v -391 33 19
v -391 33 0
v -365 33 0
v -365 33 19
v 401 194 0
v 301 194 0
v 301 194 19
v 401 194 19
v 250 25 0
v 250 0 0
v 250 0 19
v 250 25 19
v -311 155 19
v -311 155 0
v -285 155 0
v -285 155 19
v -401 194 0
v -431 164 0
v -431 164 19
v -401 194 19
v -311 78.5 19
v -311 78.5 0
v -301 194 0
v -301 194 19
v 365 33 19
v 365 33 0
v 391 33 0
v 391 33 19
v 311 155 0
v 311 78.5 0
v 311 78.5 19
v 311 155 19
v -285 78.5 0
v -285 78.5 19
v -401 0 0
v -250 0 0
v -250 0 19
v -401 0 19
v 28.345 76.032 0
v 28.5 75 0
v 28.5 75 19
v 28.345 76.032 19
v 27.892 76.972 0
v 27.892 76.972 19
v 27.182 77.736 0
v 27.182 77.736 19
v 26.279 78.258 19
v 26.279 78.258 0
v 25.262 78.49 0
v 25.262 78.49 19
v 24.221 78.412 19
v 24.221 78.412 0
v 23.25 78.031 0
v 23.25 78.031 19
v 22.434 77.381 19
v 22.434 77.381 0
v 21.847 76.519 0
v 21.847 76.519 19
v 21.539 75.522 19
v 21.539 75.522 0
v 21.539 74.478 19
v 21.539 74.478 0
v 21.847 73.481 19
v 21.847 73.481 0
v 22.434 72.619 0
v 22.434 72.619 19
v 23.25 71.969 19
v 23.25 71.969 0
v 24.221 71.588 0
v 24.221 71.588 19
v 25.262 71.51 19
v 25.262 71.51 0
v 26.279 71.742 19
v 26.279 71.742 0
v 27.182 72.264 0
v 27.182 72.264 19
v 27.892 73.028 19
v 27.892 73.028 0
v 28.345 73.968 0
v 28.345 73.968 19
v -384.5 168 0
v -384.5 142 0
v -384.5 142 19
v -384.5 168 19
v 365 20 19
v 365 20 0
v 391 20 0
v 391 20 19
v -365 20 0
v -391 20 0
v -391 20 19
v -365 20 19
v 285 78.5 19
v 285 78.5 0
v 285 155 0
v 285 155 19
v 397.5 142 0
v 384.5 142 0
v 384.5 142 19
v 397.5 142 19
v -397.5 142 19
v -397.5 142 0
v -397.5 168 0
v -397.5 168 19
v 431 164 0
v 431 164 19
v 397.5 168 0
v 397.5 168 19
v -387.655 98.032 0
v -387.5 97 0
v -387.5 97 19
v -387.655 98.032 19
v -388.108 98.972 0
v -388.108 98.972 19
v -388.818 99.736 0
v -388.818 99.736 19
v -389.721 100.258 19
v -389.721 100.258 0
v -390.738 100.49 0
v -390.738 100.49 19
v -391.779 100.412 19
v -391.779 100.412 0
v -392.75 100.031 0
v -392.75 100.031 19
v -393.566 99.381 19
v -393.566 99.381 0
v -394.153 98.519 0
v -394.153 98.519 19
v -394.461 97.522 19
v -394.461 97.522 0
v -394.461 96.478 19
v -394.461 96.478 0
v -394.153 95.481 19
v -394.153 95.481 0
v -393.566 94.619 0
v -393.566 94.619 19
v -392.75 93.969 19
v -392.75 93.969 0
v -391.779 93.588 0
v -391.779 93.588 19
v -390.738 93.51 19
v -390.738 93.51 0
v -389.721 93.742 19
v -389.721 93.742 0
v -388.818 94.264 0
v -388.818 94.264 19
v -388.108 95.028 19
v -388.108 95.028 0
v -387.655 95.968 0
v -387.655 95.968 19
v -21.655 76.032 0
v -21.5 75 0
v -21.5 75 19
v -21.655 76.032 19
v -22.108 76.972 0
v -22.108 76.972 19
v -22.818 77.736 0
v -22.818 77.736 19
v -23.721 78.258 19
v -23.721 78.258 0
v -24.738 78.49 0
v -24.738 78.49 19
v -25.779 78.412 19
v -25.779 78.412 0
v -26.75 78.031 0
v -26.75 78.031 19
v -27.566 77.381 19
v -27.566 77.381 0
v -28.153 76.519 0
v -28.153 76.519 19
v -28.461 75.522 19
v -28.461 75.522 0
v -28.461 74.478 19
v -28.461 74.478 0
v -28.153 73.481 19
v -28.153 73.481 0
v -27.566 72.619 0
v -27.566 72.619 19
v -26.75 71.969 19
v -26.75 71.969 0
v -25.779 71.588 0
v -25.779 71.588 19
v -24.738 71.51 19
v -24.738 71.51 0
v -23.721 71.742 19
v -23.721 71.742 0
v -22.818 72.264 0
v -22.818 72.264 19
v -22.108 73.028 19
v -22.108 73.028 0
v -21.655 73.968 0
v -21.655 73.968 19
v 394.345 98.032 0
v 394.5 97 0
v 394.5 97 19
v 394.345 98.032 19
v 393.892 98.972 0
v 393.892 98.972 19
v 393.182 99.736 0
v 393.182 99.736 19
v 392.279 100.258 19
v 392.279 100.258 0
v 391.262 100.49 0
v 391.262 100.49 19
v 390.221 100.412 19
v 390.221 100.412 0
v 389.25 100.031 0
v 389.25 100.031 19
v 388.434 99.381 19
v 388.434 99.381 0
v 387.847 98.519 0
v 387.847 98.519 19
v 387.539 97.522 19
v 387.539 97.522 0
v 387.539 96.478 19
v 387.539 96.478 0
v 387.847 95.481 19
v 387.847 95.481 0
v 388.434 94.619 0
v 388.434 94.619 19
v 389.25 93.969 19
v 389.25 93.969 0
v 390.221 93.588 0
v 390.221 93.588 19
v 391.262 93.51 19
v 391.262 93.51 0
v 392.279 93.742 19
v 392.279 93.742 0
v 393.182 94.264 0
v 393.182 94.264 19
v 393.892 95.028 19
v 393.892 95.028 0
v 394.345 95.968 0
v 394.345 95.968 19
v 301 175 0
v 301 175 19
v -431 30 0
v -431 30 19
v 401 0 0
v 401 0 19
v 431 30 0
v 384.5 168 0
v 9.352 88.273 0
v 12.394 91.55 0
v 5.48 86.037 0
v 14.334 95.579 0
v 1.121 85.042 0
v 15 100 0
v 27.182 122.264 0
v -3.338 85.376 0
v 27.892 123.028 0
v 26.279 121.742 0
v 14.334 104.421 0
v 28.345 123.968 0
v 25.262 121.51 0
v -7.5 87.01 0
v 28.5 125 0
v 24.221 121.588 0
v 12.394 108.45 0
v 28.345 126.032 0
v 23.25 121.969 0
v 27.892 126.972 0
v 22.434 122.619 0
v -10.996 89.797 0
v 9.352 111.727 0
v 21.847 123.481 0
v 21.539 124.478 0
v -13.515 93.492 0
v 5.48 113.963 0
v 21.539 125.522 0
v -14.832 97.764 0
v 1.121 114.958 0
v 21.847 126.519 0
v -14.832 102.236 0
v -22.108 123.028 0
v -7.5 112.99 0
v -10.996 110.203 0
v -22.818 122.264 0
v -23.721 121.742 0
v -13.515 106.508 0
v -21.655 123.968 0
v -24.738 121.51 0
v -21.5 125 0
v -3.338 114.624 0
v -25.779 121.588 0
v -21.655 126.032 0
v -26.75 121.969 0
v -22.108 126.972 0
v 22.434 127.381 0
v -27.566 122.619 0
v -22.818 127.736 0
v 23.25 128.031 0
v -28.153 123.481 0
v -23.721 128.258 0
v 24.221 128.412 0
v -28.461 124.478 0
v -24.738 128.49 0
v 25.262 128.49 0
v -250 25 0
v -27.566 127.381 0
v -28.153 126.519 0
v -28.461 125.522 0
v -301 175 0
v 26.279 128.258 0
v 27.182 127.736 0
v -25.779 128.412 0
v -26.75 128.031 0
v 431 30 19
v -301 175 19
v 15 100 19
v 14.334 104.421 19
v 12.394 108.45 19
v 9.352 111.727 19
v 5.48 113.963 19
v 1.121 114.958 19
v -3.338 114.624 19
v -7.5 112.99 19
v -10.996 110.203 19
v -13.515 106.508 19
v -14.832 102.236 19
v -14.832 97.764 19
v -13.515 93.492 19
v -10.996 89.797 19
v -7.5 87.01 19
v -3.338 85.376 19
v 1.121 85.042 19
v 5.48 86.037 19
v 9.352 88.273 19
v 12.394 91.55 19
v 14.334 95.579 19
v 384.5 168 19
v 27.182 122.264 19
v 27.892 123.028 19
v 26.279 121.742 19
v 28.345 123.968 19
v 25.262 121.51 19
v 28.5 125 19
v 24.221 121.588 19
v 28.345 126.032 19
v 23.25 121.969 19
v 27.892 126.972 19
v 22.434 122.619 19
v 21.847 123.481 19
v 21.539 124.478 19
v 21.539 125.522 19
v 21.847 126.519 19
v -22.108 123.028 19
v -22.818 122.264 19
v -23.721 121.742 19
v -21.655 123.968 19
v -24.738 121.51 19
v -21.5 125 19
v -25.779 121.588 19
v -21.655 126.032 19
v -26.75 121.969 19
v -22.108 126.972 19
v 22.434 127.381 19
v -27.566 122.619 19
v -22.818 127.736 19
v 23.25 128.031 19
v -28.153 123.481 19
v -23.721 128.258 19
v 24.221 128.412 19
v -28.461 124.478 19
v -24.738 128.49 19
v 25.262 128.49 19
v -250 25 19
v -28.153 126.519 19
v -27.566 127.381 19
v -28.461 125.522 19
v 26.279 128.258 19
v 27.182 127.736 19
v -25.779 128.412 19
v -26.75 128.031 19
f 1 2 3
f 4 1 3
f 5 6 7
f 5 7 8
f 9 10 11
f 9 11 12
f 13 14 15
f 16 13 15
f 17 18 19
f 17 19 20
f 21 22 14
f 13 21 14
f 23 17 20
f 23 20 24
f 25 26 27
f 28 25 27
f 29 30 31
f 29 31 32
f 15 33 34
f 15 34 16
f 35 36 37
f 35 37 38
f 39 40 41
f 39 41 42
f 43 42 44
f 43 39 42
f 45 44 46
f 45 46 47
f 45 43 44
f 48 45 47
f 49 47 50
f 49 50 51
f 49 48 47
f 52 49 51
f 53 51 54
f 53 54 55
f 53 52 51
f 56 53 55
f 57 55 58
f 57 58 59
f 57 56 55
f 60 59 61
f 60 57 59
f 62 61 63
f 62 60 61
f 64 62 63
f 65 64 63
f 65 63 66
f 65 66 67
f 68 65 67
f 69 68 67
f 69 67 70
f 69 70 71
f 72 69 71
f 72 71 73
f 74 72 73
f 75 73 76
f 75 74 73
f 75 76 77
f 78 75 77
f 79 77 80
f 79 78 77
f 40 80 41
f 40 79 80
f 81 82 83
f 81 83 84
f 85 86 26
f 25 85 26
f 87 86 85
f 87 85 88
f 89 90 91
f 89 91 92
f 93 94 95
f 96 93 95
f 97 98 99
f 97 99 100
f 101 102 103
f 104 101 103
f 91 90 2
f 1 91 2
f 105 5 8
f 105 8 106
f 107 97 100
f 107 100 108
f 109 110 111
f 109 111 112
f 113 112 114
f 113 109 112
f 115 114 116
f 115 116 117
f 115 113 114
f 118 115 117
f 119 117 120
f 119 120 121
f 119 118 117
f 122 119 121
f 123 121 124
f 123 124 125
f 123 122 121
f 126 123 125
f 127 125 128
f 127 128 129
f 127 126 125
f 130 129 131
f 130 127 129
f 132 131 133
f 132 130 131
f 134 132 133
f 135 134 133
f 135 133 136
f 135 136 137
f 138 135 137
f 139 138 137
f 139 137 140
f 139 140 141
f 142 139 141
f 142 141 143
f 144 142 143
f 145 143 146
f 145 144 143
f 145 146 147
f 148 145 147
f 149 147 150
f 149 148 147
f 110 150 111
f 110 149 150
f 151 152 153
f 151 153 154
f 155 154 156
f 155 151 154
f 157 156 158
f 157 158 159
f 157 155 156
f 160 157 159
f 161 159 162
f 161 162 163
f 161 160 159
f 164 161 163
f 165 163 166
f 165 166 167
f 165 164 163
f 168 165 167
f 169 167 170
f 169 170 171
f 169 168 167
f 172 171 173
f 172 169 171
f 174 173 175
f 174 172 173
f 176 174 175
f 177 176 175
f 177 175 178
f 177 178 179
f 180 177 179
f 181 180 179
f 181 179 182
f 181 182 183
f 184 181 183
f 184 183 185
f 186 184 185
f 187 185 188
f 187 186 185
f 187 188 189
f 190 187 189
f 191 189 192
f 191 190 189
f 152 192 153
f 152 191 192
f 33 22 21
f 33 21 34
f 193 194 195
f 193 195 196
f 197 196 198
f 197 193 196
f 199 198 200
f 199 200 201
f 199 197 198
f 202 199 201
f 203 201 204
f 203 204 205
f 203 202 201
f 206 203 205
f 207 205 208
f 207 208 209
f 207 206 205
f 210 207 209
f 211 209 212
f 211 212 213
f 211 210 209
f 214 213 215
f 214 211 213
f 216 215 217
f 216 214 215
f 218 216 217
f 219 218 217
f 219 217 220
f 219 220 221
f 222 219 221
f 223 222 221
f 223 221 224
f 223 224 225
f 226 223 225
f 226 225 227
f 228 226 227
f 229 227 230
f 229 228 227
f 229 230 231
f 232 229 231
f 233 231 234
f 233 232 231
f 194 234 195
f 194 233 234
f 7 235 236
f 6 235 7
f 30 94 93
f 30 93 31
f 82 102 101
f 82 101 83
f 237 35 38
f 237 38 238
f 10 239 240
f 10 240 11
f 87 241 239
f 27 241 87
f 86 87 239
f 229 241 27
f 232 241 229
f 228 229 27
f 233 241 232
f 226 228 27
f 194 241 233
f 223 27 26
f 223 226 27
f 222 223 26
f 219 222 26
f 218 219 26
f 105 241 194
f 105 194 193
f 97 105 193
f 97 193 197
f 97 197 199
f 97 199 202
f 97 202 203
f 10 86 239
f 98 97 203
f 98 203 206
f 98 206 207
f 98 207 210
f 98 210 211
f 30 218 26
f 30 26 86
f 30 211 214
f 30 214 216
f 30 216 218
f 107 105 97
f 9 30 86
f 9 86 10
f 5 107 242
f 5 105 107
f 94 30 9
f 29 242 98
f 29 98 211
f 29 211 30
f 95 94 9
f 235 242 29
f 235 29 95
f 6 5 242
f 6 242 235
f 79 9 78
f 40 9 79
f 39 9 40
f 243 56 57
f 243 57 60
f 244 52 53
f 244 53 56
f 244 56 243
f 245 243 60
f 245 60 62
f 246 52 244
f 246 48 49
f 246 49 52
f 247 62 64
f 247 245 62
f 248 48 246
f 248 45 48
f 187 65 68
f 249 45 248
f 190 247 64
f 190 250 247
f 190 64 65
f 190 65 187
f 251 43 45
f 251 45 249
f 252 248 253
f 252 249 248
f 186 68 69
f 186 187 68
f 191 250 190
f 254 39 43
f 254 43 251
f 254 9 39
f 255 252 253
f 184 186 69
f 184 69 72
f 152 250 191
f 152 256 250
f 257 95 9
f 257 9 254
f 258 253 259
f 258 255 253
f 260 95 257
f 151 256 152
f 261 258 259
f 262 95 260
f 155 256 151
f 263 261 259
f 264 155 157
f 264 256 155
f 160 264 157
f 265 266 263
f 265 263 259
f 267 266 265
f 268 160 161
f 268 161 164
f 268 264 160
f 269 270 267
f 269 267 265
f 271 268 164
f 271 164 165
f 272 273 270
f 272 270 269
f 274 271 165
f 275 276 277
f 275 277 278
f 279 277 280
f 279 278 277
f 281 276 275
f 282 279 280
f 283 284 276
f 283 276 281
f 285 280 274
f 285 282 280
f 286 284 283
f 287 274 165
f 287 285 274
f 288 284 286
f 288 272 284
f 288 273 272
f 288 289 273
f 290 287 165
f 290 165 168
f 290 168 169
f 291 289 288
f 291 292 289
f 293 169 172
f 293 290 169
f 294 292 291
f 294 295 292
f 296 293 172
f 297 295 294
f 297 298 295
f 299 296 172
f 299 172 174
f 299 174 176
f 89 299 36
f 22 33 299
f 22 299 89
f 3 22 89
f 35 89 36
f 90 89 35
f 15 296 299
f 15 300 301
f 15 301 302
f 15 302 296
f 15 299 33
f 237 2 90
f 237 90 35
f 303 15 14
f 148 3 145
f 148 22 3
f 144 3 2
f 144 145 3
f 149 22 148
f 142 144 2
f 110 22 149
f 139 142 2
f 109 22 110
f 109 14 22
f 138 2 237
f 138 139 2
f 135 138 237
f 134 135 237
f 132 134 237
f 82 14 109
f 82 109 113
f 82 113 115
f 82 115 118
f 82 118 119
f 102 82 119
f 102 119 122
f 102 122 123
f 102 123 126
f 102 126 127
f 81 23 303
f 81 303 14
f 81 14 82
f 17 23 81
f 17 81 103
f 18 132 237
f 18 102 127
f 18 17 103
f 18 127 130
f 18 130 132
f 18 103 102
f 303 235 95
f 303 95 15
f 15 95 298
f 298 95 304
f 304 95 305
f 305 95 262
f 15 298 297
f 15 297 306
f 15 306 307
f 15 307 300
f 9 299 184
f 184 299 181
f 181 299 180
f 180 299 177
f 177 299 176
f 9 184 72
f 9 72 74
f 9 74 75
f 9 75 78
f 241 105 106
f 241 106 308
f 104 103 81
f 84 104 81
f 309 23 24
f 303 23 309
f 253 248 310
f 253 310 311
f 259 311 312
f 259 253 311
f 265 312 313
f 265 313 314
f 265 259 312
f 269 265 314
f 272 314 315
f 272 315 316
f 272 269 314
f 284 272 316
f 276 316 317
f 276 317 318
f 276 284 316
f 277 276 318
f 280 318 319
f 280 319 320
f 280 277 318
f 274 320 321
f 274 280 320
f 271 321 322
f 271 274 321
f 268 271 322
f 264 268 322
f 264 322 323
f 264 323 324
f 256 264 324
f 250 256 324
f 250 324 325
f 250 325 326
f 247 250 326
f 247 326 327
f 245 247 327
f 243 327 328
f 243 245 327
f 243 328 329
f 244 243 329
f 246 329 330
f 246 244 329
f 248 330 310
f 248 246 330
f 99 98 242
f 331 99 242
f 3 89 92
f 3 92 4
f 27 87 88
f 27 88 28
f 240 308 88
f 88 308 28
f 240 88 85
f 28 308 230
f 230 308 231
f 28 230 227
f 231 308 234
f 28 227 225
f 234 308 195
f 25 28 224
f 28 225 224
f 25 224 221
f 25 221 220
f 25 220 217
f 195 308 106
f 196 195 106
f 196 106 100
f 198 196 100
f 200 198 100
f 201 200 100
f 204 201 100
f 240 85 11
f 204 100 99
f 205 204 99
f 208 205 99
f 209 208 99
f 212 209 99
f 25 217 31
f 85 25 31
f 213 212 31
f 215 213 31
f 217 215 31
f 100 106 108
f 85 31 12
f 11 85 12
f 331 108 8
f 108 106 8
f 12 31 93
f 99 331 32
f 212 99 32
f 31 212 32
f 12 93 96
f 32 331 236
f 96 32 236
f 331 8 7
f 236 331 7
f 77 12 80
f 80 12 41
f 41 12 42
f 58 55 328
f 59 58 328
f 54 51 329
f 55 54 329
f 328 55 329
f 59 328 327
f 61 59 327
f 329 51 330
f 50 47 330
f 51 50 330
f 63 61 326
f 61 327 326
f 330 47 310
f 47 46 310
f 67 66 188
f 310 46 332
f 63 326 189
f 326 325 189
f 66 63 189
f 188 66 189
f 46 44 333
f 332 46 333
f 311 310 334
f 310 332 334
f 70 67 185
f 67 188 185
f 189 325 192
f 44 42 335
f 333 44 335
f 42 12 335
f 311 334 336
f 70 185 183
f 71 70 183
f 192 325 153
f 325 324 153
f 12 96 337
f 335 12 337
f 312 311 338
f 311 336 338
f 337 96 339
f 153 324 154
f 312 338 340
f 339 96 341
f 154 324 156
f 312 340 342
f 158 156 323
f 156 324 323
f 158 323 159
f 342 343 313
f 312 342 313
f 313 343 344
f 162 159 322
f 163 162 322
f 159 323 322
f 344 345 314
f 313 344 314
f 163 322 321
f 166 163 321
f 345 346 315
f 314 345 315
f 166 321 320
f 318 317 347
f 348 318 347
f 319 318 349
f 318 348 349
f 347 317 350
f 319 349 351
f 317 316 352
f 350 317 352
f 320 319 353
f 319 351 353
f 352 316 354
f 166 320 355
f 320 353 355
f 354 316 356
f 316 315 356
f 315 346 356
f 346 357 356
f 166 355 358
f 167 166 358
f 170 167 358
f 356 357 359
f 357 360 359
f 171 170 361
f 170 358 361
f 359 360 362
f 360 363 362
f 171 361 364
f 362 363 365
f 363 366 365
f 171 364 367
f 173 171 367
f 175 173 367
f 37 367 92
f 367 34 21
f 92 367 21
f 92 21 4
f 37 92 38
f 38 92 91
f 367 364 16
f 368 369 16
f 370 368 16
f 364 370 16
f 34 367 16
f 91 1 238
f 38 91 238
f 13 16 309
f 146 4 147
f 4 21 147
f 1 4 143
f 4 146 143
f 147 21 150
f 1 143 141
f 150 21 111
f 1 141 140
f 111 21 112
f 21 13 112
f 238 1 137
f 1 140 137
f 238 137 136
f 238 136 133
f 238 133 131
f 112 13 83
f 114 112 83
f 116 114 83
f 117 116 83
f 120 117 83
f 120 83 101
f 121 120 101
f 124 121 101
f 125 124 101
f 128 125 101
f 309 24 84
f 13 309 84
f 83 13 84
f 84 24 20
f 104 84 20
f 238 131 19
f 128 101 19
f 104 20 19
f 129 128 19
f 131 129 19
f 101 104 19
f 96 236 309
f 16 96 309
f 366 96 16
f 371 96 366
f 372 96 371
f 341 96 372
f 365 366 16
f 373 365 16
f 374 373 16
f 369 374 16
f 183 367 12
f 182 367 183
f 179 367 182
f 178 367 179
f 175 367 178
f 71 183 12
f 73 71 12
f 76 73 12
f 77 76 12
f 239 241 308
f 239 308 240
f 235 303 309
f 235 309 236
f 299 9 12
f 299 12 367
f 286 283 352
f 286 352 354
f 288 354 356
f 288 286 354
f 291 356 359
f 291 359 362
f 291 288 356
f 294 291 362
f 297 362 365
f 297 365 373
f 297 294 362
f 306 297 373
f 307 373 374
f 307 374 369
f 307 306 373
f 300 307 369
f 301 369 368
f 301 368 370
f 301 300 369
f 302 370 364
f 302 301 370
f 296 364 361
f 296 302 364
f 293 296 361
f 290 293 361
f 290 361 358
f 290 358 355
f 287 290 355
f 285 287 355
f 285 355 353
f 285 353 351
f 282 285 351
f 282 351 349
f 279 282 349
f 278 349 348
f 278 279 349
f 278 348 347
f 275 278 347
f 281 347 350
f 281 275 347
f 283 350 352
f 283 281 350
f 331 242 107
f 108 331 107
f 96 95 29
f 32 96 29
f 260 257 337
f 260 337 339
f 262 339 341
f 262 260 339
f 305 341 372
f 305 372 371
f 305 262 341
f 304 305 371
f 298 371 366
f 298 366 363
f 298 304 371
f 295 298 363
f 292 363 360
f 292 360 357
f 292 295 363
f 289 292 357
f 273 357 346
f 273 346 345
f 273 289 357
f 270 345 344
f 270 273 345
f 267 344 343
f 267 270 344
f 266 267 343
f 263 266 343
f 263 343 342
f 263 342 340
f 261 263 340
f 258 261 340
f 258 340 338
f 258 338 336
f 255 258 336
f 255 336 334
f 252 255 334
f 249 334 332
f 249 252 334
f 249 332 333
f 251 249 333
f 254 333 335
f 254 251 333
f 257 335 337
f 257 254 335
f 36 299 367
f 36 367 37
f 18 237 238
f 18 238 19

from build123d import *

# Parameters (mm, degrees)
CROQUIS1_R              = 3.5
CROQUIS1_R_2            = 15
CROQUIS1_W              = 26
CROQUIS1_H              = 76.5
CROQUIS1_H_2            = 13
CROQUIS1_W_2            = 13
CROQUIS1_H_3            = 26
SALIENTE_EXTRUIR1_DEPTH = 19


with BuildPart() as part:
    # Croquis1 → Saliente-Extruir1 (new body)
    with BuildSketch(Plane.XY):
        Polygon((-301, 194), (-301, 175), (301, 175), (301, 194), (401, 194), (431, 164), (431, 30), (401, 0), (250, 0), (250, 25), (-250, 25), (-250, 0), (-401, 0), (-431, 30), (-431, 164), (-401, 194), align=None)
        with Locations((-391, 97)):
            Circle(CROQUIS1_R, mode=Mode.SUBTRACT)
        with Locations((391, 97)):
            Circle(CROQUIS1_R, mode=Mode.SUBTRACT)
        with Locations((0, 100)):
            Circle(CROQUIS1_R_2, mode=Mode.SUBTRACT)
        with Locations((-25, 125)):
            Circle(CROQUIS1_R, mode=Mode.SUBTRACT)
        with Locations((25, 125)):
            Circle(CROQUIS1_R, mode=Mode.SUBTRACT)
        with Locations((25, 75)):
            Circle(CROQUIS1_R, mode=Mode.SUBTRACT)
        with Locations((-25, 75)):
            Circle(CROQUIS1_R, mode=Mode.SUBTRACT)
        with Locations((-298, 116.75)):
            Rectangle(CROQUIS1_W, CROQUIS1_H, mode=Mode.SUBTRACT)
        with Locations((298, 116.75)):
            Rectangle(CROQUIS1_W, CROQUIS1_H, mode=Mode.SUBTRACT)
        with Locations((378, 26.5)):
            Rectangle(CROQUIS1_W, CROQUIS1_H_2, mode=Mode.SUBTRACT)
        with Locations((-378, 26.5)):
            Rectangle(CROQUIS1_W, CROQUIS1_H_2, mode=Mode.SUBTRACT)
        with Locations((391, 155)):
            Rectangle(CROQUIS1_W_2, CROQUIS1_H_3, mode=Mode.SUBTRACT)
        with Locations((-391, 155)):
            Rectangle(CROQUIS1_W_2, CROQUIS1_H_3, mode=Mode.SUBTRACT)
    extrude(amount=SALIENTE_EXTRUIR1_DEPTH)


solid = part.part
